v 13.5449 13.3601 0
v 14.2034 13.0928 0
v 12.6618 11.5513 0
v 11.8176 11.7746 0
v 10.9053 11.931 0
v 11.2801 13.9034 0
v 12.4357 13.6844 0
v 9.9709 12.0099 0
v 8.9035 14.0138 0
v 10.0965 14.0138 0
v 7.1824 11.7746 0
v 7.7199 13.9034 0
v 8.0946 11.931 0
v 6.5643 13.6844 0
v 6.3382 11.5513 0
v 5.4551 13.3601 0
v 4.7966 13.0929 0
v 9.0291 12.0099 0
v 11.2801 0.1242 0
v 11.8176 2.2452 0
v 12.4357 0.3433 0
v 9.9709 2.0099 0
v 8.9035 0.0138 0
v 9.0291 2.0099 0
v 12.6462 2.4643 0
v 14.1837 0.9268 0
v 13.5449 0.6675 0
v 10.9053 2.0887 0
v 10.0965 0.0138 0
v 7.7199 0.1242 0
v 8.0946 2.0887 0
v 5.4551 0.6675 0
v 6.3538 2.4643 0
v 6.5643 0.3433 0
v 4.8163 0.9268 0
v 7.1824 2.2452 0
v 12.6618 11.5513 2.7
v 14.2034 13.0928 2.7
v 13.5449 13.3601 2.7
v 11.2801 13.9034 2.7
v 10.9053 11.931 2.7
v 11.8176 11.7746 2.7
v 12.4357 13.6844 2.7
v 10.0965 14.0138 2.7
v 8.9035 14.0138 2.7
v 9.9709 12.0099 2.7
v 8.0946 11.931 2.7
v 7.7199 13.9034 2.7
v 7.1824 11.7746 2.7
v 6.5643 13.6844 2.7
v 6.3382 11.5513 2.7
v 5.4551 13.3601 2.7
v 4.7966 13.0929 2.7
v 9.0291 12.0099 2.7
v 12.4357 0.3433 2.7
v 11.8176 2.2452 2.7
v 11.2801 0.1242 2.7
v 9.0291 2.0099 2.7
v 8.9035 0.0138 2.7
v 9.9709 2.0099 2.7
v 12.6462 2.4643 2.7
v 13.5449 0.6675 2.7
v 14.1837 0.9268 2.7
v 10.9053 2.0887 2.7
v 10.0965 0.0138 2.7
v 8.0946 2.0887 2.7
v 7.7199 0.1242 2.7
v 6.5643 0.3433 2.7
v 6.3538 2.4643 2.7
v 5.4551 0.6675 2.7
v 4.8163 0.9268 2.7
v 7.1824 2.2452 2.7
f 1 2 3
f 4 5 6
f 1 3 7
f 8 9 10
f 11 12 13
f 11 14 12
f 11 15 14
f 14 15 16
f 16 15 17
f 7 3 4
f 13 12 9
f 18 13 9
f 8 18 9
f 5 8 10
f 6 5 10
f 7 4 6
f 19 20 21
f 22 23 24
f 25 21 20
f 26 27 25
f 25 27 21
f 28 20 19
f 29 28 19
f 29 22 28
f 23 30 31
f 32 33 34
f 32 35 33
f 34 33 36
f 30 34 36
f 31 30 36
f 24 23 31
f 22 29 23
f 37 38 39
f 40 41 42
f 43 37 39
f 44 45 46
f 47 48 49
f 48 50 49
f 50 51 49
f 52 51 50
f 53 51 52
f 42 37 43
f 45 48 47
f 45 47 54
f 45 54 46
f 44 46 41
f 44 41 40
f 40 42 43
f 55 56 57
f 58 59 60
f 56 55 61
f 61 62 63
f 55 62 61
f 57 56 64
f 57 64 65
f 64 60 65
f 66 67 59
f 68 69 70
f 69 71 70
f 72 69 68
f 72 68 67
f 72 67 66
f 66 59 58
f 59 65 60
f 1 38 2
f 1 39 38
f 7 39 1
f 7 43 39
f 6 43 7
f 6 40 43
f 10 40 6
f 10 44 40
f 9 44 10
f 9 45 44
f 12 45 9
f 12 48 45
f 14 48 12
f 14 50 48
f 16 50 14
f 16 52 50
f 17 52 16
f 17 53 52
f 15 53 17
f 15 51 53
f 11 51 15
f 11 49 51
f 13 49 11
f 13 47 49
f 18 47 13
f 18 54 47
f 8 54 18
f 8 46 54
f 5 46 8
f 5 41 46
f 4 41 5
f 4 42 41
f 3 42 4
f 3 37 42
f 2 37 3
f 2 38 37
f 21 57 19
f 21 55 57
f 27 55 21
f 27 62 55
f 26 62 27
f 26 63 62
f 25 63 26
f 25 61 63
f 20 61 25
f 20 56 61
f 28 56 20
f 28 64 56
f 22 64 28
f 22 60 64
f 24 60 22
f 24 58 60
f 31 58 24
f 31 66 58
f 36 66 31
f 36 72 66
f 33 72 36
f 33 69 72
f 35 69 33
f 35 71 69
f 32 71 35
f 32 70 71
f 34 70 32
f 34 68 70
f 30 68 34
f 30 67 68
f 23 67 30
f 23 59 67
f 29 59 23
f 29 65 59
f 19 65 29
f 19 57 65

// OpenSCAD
// file: ../lib/primitive/rounded_square.scad
include <../config/constants.scad>

module rounded_square(size, flat_top=false, flat_bottom=false) {
  assert(!(flat_top && flat_bottom), "Flat top and flat bottom are exclusive");

  rounding_height = flat_top || flat_bottom 
    ? $rounding 
    : $rounding * 2;

  offset = flat_bottom ? 0 : $rounding;

  inner_size = [
    size[0] - $rounding * 2,
    size[1] - rounding_height,
  ];

  minkowski() {
    translate([$rounding, offset]) {
      square(inner_size);
    }
    if (flat_top ) {
      difference() {
        circle($rounding);
        translate([-$rounding, 0]) {
          square([$rounding * 2, $rounding]);
        }
      }
    } else if (flat_bottom) {
      difference() {
        circle($rounding);
        translate([-$rounding, -$rounding]) {
          square([$rounding * 2, $rounding]);
        }
      }
    } else {
      circle($rounding);
    }
  }
}
// file: ../lib/primitive/rounded_cube.scad
include <./rounded_square.scad>
include <../config/constants.scad>

// Render a rounded cube
// flat_top: do not round the top edges
// flat_bottom: do not round the bottom edges
// flat: equals flat_top && flat_bottom
// 
// Limitations:
// requires height > $rounding * 2
// flat_top || flat_bottom requires height > $rounding
// flat_top && flat_bottom requires height > $bleed
module rounded_cube(
  size, 
  flat=false, 
  flat_top=false, 
  flat_bottom=false,
  side_rounding=-1
) {
  _flat = flat || (flat_top && flat_bottom);
  _flat_top = flat_top || flat;
  _flat_bottom = flat_bottom || flat;
  _rounding = min($rounding, size[2] / 2);
  _side_rounding = side_rounding > -1 ? side_rounding: $rounding;

  assert(_side_rounding >= $rounding, "side rounding cannot be less than rounding");

  top_height = _flat_top ? 0: _rounding;
  bottom_height = _flat_bottom ? 0: _rounding;

  cube_size = [
    size[0] - _rounding * 2,
    size[1] - _rounding * 2,
    size[2] - (top_height + bottom_height)
  ];

  if (_flat_top && _flat_bottom) {
     linear_extrude(cube_size[2]) {
       rounded_square([size[0], size[1]]);
     }
   } else {
     minkowski() {
       translate([_rounding, _rounding, bottom_height]) {
         if (_side_rounding != _rounding) {
           linear_extrude(cube_size[2]) {
             rounded_square([cube_size[0], cube_size[1]], $rounding=_side_rounding);
           }
         } else {
           cube(cube_size);
         }
       }

       if (_flat_top) {
         difference() {
           sphere(_rounding);
           cylinder(_rounding, _rounding, _rounding);
         }
       } else if (_flat_bottom) {
         difference() {
           sphere(_rounding);
           translate ([0, 0, -_rounding]) {
             cylinder(_rounding, _rounding, _rounding);
           }
         }
       } else {
         sphere(_rounding);
       }
    }
  }
}
// file: ../vendor/honeycomb.scad
/**
 * Honeycomb library
 * License: Creative Commons - Attribution
 * Copyright: Gael Lafond 2017
 * URL: https://www.thingiverse.com/thing:2484395
 *
 * Inspired from:
 *   https://www.thingiverse.com/thing:1763704
 */

// a single filled hexagon
module hexagon(l)  {
	circle(d=l, $fn=6);
}

// parametric honeycomb  
module honeycomb(x, y, dia, wall)  {
	// Diagram
	//          ______     ___
	//         /     /\     |
	//        / dia /  \    | smallDia
	//       /     /    \  _|_
	//       \          /   ____ 
	//        \        /   / 
	//     ___ \______/   / 
	// wall |            /
	//     _|_  ______   \
	//         /      \   \
	//        /        \   \
	//                 |---|
	//                   projWall
	//
	smallDia = dia * cos(30);
	projWall = wall * cos(30);

	yStep = smallDia + wall;
	xStep = dia*3/2 + projWall*2;

	difference()  {
		square([x, y]);

		// Note, number of step+1 to ensure the whole surface is covered
		for (yOffset = [0:yStep:y+yStep], xOffset = [0:xStep:x+xStep]) {
			translate([xOffset, yOffset]) {
				hexagon(dia);
			}
			translate([xOffset + dia*3/4 + projWall, yOffset + (smallDia+wall)/2]) {
				hexagon(dia);
			}
		}
	}
}
// file: ../lib/design/honeycomb.scad
include <../../vendor/honeycomb.scad>
include <../primitive/rounded_cube.scad>
include <../config/constants.scad>

function relative_diameter(dimensions, hexagons_per_size=2) = (
  min(
    dimensions[0],
    dimensions[1]) + $wall_thickness
  ) / hexagons_per_side;

function honeycomb_inset_size(size, inset = $wall_thickness) = [
    size[0] - $wall_thickness,
    size[1] - inset * 2,
    size[2] + $bleed * 2,
];

module block_border(dimensions) {
  inner_dimensions = [
    dimensions[0] - $wall_thickness * 2,
    dimensions[1] - $wall_thickness * 2,
    dimensions[2] + $bleed * 2
  ];

  difference() {
    rounded_cube(dimensions, flat_top=true, flat_bottom=true);

    translate([$wall_thickness, $wall_thickness, -$bleed]) {
      rounded_cube(inner_dimensions, flat_top=true, flat_bottom=true);
    }
  }
}

module negative_honeycomb_cube(dimensions, diameter=-1) {
  honeycomb_size = [
    dimensions[0],
    dimensions[1],
    dimensions[2] + $bleed * 2,
  ];

  difference() {
    cube(dimensions);
    translate([0, 0, -$bleed]) {
      honeycomb_cube(dimensions, diameter);
    }
  }
}

module honeycomb_cube(dimensions, diameter=-1) {
  _diameter = diameter > 0
    ? diameter
    : relative_diameter(dimensions);

  linear_extrude(dimensions[2]) {
    honeycomb(dimensions[0], dimensions[1], _diameter, $wall_thickness);
  }
}

module honeycomb_spacer(dimensions) {
  honeycomb_cube(dimensions);

  block_border(dimensions);
}
// file: ../lib/config/constants.scad
// Shared constants reflect things that are true for the whole model not just a single component.
// They should by definition be required by multiple components.
$fn = 10;

$abs_filament = false;

$wall_thickness = 2;
$wall_rect = [$wall_thickness, $wall_thickness];
$inner_wall_thickness = 1;

$bleed = 0.01;

$padding = 0.5;
$padding_rect = [$padding * 2, $padding * 2];

$card_padding = 1.5;

$inset = 6;
$cutout_fraction = 0.6;

$rounding = 3;

// TODO are both needed?
$lid_height = 2;
$cutout_lid_height = 2;

$trapezoid_inset = 1;
// file: ../lib/compound/notched_cube.scad
include <../layout/layout.scad>
include <../design/honeycomb.scad>
include <../config/constants.scad>

// I have no idea why it needs to be this vaule
// Seems to be to do with how the cube handles rounding
magic_pill_number = 0.4;

// TODO review pill feature, it's been changed to include padding so
// the magic pill number might no longer be needed
function cutout_rounding (size, pill=false) = pill
  ? min(size[0], size[1]) / 2  + magic_pill_number:
  1;

function cutout_fraction_size(length) = length * $cutout_fraction;

function cutout_fraction_rect(rect) = [
  cutout_fraction_size(rect[0]),
  cutout_fraction_size(rect[1]),
];

module notched_cube(
  size,
  floor_height=$wall_thickness,
  left_cutout=false,
  right_cutout=false,
  top_cutout=false,
  bottom_cutout=false,
  honeycomb_diameter=undef,
  pill=false,
  floor_cutout=false,
  cutout_size=undef,
  bounding_box=undef,
) {
  _bounding_box = bounding_box == undef ? size : bounding_box;
  cutout_fraction = cutout_fraction_size(cutout_size == undef ? size : cutout_size);

  assert(size[2] > floor_height, "Box height shorter than floor height");
  assert(size[0] <= _bounding_box[0], "Bounding box must be greater than or equal to size");
  assert(size[1] <= _bounding_box[1], "Bounding box must be greater than or equal to size");

  honeycomb_base = honeycomb_diameter != undef;
  inset_length = $inset * 2 + $wall_thickness;
  box_offset = offset_centre_in_box(size, _bounding_box);

  cutout_size = [
    size[0],
    size[1],
    size[2] - floor_height + $bleed,
  ];

  translate(box_offset) {
    translate([0, 0, floor_height]) {
      rounded_cube(cutout_size, flat = true, $rounding = cutout_rounding(size, pill));
    }

    if (left_cutout) {
      left_cutout_size = [
        inset_length + box_offset[0],
        cutout_fraction[1],
        size[2] + $cutout_lid_height + $bleed * 2,
      ];

      translate([
        - left_cutout_size[0] + $inset,
        (size[1] - left_cutout_size[1]) / 2,
        0
      ]) {
        rounded_cube(left_cutout_size, flat = true);
      }
    }

    if (right_cutout) {
      right_cutout_size = [
        inset_length + box_offset[0],
        cutout_fraction[1],
        size[2] + $cutout_lid_height + $bleed * 2,
      ];

      translate([
        size[0] - $inset,
        (size[1] - right_cutout_size[1]) / 2,
        0
      ]) {
        rounded_cube(right_cutout_size, flat = true);
      }
    }

    if (top_cutout) {
      top_cutout_size = [
        cutout_fraction[0],
        inset_length + box_offset[1],
        size[2] + $cutout_lid_height + $bleed * 2,
      ];

      translate([
        (size[0] - top_cutout_size[0]) / 2,
        size[1] - $inset,
        0
      ]) {
        rounded_cube(top_cutout_size, flat = true);
      }
    }

    if (bottom_cutout) {
      bottom_cutout_size = [
        cutout_fraction[0],
        inset_length + box_offset[1],
        size[2] + $cutout_lid_height + $bleed * 2,
      ];

      translate([
        (size[0] - bottom_cutout_size[0]) / 2,
        - bottom_cutout_size[1] + $inset,
        0
      ]) {
        rounded_cube(bottom_cutout_size, flat = true);
      }
    }

    // clearences to help place things inside without hitting the other cutouts
    frame_thickness = honeycomb_base ? $wall_thickness : ($wall_thickness * 3);

    left_clearance = (left_cutout ? $inset : 0) + frame_thickness;
    right_clearance = (right_cutout ? $inset : 0) + frame_thickness;
    top_clearance = (top_cutout ? $inset : 0) + frame_thickness;
    bottom_clearance = (bottom_cutout ? $inset : 0) + frame_thickness;

    floor_cutout_size = [
      size[0] - left_clearance - right_clearance,
      size[1] - top_clearance - bottom_clearance,
      floor_height + $bleed * 2,
    ];

    if (honeycomb_base || floor_cutout) {
      translate([left_clearance, bottom_clearance, - $bleed]) {
        if (honeycomb_base) {
          negative_honeycomb_cube(floor_cutout_size, honeycomb_diameter);
        } else if (floor_cutout) {
          rounded_cube(floor_cutout_size, flat = true);
        }
      }
    }
  }
}
// file: ../lib/layout/layout.scad
include <../config/constants.scad>

function stack_height (size, count=1) = size * count + $padding;

function padded_offset (length, index=1) = (length + $padding * 2 + $wall_thickness) * index;

function offset (size, index=1) = (size + $wall_thickness) * index;

function pad (size) = size + $padding * 2;

function divide_rect(rect, operand) = [rect[0] / operand, rect[1] / operand];
function multiply_rect(rect, operand) = [rect[0] * operand, rect[1] * operand];

function divide_cube(rect, operand) = [rect[0] / operand, rect[1] / operand, rec[2] / operand];
function multiply_cube(rect, operand) = [rect[0] * operand, rect[1] * operand, rect[2] * operand];

function offset_centre_in_box(size, bounding_box) = divide_rect(bounding_box - size, 2);

module offset_cylinder(d, h) {
  translate([d / 2, d / 2, 0]) {
    cylinder(d=d, h=h);
  }
}

module offset_circle(d) {
  translate([d / 2, d / 2, 0]) {
    circle(d=d);
  }
}

module offset_square(size, center=false) {
  translate([size[0] / 2, size[1] / 2, 0]) {
    square(size, center=center);
  }
}
// file: ../lib/primitive/disc_bracket.scad
include <../layout/layout.scad>
include <../compound/notched_cube.scad>
include <../config/constants.scad>

module disc_bracket(size, count=1) {
  outter_size = size + [$wall_thickness * 2, $wall_thickness * 2, 0];
  stack_height = stack_height(size[2], count);

  linear_extrude(stack_height) {
    difference() {
      resize([outter_size[0], outter_size[1]]) {
        offset_circle(outter_size[0]);
      }

      translate([$wall_thickness, $wall_thickness, 0]) {
        resize([size[0], size[1]]) {
          offset_circle(size[0]);
        }
      }

      cutout_scale = 1.1;
      translate([0, outter_size[1] / 2, 0]) {
        rotate(45) {
          square([outter_size[1] * cutout_scale, outter_size[1] * cutout_scale], center=true);
        }
      }
      translate([outter_size[0], outter_size[1] / 2, 0]) {
        rotate(45) {
          square([outter_size[1] * cutout_scale, outter_size[1] * cutout_scale], center=true);
        }
      }
    }
  }
}
// main file
include <../lib/primitive/disc_bracket.scad>

$fn = 50;

disc_bracket([15, 10, 2.2]);
